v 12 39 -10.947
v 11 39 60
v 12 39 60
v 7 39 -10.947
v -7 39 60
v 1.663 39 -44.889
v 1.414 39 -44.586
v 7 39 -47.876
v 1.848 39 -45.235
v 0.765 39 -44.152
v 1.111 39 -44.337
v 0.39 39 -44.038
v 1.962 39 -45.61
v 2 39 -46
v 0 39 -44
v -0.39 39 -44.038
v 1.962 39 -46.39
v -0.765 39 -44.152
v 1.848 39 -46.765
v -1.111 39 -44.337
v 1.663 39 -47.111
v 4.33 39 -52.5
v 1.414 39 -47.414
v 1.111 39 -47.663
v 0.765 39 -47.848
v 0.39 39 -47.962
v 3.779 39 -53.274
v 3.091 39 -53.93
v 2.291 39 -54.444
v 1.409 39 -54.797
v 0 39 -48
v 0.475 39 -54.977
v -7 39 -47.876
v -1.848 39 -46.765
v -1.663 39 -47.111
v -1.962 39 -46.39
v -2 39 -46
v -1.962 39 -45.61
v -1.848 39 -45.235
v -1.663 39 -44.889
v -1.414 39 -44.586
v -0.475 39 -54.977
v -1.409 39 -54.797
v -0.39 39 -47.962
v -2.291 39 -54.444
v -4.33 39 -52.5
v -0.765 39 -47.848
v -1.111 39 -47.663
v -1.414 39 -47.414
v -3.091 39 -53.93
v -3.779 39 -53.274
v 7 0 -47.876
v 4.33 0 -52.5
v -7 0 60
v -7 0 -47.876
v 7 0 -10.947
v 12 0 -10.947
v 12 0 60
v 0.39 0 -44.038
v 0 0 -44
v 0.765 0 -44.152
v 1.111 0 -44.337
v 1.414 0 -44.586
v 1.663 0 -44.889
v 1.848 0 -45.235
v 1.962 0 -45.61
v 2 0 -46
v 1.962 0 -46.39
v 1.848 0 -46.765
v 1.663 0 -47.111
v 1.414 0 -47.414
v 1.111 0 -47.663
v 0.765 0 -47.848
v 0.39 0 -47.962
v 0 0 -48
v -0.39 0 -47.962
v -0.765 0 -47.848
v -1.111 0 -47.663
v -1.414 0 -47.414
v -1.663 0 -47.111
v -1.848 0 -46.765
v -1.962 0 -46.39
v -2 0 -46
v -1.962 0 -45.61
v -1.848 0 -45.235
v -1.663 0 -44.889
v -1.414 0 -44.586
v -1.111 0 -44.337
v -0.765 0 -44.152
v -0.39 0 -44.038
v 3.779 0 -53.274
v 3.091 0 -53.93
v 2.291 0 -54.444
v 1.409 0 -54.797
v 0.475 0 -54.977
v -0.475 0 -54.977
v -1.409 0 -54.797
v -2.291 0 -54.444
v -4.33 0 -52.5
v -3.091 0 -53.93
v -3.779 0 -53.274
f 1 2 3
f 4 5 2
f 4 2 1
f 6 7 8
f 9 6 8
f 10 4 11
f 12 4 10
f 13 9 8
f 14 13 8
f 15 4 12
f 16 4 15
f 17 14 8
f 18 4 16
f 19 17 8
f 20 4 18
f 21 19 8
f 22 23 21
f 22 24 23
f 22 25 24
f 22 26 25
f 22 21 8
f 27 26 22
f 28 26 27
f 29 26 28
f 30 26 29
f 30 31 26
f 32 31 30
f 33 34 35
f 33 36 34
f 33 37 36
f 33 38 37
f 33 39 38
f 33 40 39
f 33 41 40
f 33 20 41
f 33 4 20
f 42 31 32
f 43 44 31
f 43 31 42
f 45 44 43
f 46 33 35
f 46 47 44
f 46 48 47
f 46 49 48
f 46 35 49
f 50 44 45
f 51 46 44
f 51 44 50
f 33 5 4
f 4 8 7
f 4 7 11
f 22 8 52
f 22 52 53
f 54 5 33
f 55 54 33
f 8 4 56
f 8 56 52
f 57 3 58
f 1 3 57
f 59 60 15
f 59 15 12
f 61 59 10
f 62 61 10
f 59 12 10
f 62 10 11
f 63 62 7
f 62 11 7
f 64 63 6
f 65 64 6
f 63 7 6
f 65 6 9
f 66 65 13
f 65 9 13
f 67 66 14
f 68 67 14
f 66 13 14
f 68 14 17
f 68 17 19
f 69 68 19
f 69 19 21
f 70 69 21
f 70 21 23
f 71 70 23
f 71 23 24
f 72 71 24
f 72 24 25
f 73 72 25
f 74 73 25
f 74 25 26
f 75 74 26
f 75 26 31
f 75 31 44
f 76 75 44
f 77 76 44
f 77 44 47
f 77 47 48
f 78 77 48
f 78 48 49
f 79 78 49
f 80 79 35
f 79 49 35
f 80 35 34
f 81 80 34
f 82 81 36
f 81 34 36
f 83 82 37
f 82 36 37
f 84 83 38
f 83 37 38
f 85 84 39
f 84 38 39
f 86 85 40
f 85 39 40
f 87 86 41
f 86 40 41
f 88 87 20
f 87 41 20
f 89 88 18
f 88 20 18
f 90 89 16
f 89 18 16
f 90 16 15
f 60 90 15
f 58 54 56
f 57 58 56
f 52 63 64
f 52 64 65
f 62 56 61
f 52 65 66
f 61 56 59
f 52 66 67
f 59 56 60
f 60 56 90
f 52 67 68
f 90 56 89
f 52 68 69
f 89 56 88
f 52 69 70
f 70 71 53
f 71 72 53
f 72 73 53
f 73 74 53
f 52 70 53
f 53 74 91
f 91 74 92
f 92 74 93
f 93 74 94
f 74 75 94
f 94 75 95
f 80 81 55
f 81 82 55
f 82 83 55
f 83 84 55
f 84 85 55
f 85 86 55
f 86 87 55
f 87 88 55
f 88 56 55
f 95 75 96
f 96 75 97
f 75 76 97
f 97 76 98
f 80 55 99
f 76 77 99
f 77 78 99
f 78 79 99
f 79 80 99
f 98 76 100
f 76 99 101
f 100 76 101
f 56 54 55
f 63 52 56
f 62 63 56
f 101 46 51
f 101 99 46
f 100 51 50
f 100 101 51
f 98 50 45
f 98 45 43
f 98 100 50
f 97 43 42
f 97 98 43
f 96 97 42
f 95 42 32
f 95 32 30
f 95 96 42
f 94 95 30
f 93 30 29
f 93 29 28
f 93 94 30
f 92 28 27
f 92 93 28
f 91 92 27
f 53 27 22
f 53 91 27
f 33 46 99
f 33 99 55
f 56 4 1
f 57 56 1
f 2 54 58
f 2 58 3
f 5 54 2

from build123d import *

# Parameters (mm, degrees)
SKETCH1_W           = 22
SKETCH1_H           = 120
BOSS_EXTRUDE1_DEPTH = 39
SKETCH2_OUTSIDE_W   = 49.616
SKETCH2_OUTSIDE_H   = 147.616
CUT_EXTRUDE1_DEPTH  = 73.40165744
FILLET1_R           = 5
CUT_EXTRUDE2_DEPTH  = 73.40165744
SKETCH4_W           = 96.947441117
SKETCH4_H           = 39
BOSS_EXTRUDE2_DEPTH = 5
SKETCH5_W           = 4
SKETCH5_H           = 96.947441117
CUT_EXTRUDE3_DEPTH  = 74.328030111
SKETCH6_W           = 4
SKETCH6_H           = 96.947441117
CUT_EXTRUDE4_DEPTH  = 74.328030111
SKETCH7_R           = 2
CUT_EXTRUDE5_DEPTH  = 73.560319735
SKETCH8_W           = 5
SKETCH8_H           = 26
CUT_EXTRUDE6_DEPTH  = 73.560319735


with BuildPart() as part:
    # Sketch1 → Boss-Extrude1 (new body)
    with BuildSketch(Plane(origin=(0, 0, 0), x_dir=(1, 0, 0), z_dir=(0, 1, 0))):
        Rectangle(SKETCH1_W, SKETCH1_H)
    extrude(amount=BOSS_EXTRUDE1_DEPTH)

    # Sketch2 outside → Cut-Extrude1 (cut, through all)
    with BuildSketch(Plane(origin=(0, 39, 0), x_dir=(1, 0, 0), z_dir=(0, 1, 0))):
        Rectangle(SKETCH2_OUTSIDE_W, SKETCH2_OUTSIDE_H)
        Polygon((0, 60), (-11, 40.947441117), (-11, -60), (11, -60), (11, 40.947441117), align=None, mode=Mode.SUBTRACT)
    extrude(amount=-CUT_EXTRUDE1_DEPTH, mode=Mode.SUBTRACT)

    # Fillet1
    fillet1_edges = [part.edges().sort_by_distance(p)[0] for p in [
        (0, 19.5, -60),
    ]]
    fillet(fillet1_edges, radius=FILLET1_R)

    # Sketch3 → Cut-Extrude2 (cut, through all)
    with BuildSketch(Plane(origin=(0, 39, 0), x_dir=(1, 0, 0), z_dir=(0, 1, 0))):
        Polygon((-11, 36.947441117), (-7, 36.947441117), (-7, 47.875644347), (-11, 40.947441117), align=None)
        Polygon((7, 47.875644347), (11, 40.947441117), (11, 36.947441117), (7, 36.947441117), align=None)
    extrude(amount=-CUT_EXTRUDE2_DEPTH, mode=Mode.SUBTRACT)

    # Sketch4 → Boss-Extrude2 (add)
    with BuildSketch(Plane(origin=(11, 0, 0), x_dir=(0, 0, -1), z_dir=(1, 0, 0))):
        with Locations((-11.526279442, 19.5)):
            Rectangle(SKETCH4_W, SKETCH4_H)
    extrude(amount=BOSS_EXTRUDE2_DEPTH)

    # Sketch5 → Cut-Extrude3 (cut, through all)
    with BuildSketch(Plane(origin=(0, 39, 0), x_dir=(1, 0, 0), z_dir=(0, 1, 0))):
        with Locations((-9, -11.526279442)):
            Rectangle(SKETCH5_W, SKETCH5_H)
    extrude(amount=-CUT_EXTRUDE3_DEPTH, mode=Mode.SUBTRACT)

    # Sketch6 → Cut-Extrude4 (cut, through all)
    with BuildSketch(Plane(origin=(0, 39, 0), x_dir=(1, 0, 0), z_dir=(0, 1, 0))):
        with Locations((14, -11.526279442)):
            Rectangle(SKETCH6_W, SKETCH6_H)
    extrude(amount=-CUT_EXTRUDE4_DEPTH, mode=Mode.SUBTRACT)

    # Sketch7 → Cut-Extrude5 (cut, through all)
    with BuildSketch(Plane(origin=(0, 39, 0), x_dir=(1, 0, 0), z_dir=(0, 1, 0))):
        with Locations((0, 46)):
            Circle(SKETCH7_R)
    extrude(amount=-CUT_EXTRUDE5_DEPTH, mode=Mode.SUBTRACT)

    # Sketch8 → Cut-Extrude6 (cut, through all)
    with BuildSketch(Plane(origin=(0, 39, 0), x_dir=(1, 0, 0), z_dir=(0, 1, 0))):
        with Locations((9.5, 23.947441117)):
            Rectangle(SKETCH8_W, SKETCH8_H)
    extrude(amount=-CUT_EXTRUDE6_DEPTH, mode=Mode.SUBTRACT)


solid = part.part
